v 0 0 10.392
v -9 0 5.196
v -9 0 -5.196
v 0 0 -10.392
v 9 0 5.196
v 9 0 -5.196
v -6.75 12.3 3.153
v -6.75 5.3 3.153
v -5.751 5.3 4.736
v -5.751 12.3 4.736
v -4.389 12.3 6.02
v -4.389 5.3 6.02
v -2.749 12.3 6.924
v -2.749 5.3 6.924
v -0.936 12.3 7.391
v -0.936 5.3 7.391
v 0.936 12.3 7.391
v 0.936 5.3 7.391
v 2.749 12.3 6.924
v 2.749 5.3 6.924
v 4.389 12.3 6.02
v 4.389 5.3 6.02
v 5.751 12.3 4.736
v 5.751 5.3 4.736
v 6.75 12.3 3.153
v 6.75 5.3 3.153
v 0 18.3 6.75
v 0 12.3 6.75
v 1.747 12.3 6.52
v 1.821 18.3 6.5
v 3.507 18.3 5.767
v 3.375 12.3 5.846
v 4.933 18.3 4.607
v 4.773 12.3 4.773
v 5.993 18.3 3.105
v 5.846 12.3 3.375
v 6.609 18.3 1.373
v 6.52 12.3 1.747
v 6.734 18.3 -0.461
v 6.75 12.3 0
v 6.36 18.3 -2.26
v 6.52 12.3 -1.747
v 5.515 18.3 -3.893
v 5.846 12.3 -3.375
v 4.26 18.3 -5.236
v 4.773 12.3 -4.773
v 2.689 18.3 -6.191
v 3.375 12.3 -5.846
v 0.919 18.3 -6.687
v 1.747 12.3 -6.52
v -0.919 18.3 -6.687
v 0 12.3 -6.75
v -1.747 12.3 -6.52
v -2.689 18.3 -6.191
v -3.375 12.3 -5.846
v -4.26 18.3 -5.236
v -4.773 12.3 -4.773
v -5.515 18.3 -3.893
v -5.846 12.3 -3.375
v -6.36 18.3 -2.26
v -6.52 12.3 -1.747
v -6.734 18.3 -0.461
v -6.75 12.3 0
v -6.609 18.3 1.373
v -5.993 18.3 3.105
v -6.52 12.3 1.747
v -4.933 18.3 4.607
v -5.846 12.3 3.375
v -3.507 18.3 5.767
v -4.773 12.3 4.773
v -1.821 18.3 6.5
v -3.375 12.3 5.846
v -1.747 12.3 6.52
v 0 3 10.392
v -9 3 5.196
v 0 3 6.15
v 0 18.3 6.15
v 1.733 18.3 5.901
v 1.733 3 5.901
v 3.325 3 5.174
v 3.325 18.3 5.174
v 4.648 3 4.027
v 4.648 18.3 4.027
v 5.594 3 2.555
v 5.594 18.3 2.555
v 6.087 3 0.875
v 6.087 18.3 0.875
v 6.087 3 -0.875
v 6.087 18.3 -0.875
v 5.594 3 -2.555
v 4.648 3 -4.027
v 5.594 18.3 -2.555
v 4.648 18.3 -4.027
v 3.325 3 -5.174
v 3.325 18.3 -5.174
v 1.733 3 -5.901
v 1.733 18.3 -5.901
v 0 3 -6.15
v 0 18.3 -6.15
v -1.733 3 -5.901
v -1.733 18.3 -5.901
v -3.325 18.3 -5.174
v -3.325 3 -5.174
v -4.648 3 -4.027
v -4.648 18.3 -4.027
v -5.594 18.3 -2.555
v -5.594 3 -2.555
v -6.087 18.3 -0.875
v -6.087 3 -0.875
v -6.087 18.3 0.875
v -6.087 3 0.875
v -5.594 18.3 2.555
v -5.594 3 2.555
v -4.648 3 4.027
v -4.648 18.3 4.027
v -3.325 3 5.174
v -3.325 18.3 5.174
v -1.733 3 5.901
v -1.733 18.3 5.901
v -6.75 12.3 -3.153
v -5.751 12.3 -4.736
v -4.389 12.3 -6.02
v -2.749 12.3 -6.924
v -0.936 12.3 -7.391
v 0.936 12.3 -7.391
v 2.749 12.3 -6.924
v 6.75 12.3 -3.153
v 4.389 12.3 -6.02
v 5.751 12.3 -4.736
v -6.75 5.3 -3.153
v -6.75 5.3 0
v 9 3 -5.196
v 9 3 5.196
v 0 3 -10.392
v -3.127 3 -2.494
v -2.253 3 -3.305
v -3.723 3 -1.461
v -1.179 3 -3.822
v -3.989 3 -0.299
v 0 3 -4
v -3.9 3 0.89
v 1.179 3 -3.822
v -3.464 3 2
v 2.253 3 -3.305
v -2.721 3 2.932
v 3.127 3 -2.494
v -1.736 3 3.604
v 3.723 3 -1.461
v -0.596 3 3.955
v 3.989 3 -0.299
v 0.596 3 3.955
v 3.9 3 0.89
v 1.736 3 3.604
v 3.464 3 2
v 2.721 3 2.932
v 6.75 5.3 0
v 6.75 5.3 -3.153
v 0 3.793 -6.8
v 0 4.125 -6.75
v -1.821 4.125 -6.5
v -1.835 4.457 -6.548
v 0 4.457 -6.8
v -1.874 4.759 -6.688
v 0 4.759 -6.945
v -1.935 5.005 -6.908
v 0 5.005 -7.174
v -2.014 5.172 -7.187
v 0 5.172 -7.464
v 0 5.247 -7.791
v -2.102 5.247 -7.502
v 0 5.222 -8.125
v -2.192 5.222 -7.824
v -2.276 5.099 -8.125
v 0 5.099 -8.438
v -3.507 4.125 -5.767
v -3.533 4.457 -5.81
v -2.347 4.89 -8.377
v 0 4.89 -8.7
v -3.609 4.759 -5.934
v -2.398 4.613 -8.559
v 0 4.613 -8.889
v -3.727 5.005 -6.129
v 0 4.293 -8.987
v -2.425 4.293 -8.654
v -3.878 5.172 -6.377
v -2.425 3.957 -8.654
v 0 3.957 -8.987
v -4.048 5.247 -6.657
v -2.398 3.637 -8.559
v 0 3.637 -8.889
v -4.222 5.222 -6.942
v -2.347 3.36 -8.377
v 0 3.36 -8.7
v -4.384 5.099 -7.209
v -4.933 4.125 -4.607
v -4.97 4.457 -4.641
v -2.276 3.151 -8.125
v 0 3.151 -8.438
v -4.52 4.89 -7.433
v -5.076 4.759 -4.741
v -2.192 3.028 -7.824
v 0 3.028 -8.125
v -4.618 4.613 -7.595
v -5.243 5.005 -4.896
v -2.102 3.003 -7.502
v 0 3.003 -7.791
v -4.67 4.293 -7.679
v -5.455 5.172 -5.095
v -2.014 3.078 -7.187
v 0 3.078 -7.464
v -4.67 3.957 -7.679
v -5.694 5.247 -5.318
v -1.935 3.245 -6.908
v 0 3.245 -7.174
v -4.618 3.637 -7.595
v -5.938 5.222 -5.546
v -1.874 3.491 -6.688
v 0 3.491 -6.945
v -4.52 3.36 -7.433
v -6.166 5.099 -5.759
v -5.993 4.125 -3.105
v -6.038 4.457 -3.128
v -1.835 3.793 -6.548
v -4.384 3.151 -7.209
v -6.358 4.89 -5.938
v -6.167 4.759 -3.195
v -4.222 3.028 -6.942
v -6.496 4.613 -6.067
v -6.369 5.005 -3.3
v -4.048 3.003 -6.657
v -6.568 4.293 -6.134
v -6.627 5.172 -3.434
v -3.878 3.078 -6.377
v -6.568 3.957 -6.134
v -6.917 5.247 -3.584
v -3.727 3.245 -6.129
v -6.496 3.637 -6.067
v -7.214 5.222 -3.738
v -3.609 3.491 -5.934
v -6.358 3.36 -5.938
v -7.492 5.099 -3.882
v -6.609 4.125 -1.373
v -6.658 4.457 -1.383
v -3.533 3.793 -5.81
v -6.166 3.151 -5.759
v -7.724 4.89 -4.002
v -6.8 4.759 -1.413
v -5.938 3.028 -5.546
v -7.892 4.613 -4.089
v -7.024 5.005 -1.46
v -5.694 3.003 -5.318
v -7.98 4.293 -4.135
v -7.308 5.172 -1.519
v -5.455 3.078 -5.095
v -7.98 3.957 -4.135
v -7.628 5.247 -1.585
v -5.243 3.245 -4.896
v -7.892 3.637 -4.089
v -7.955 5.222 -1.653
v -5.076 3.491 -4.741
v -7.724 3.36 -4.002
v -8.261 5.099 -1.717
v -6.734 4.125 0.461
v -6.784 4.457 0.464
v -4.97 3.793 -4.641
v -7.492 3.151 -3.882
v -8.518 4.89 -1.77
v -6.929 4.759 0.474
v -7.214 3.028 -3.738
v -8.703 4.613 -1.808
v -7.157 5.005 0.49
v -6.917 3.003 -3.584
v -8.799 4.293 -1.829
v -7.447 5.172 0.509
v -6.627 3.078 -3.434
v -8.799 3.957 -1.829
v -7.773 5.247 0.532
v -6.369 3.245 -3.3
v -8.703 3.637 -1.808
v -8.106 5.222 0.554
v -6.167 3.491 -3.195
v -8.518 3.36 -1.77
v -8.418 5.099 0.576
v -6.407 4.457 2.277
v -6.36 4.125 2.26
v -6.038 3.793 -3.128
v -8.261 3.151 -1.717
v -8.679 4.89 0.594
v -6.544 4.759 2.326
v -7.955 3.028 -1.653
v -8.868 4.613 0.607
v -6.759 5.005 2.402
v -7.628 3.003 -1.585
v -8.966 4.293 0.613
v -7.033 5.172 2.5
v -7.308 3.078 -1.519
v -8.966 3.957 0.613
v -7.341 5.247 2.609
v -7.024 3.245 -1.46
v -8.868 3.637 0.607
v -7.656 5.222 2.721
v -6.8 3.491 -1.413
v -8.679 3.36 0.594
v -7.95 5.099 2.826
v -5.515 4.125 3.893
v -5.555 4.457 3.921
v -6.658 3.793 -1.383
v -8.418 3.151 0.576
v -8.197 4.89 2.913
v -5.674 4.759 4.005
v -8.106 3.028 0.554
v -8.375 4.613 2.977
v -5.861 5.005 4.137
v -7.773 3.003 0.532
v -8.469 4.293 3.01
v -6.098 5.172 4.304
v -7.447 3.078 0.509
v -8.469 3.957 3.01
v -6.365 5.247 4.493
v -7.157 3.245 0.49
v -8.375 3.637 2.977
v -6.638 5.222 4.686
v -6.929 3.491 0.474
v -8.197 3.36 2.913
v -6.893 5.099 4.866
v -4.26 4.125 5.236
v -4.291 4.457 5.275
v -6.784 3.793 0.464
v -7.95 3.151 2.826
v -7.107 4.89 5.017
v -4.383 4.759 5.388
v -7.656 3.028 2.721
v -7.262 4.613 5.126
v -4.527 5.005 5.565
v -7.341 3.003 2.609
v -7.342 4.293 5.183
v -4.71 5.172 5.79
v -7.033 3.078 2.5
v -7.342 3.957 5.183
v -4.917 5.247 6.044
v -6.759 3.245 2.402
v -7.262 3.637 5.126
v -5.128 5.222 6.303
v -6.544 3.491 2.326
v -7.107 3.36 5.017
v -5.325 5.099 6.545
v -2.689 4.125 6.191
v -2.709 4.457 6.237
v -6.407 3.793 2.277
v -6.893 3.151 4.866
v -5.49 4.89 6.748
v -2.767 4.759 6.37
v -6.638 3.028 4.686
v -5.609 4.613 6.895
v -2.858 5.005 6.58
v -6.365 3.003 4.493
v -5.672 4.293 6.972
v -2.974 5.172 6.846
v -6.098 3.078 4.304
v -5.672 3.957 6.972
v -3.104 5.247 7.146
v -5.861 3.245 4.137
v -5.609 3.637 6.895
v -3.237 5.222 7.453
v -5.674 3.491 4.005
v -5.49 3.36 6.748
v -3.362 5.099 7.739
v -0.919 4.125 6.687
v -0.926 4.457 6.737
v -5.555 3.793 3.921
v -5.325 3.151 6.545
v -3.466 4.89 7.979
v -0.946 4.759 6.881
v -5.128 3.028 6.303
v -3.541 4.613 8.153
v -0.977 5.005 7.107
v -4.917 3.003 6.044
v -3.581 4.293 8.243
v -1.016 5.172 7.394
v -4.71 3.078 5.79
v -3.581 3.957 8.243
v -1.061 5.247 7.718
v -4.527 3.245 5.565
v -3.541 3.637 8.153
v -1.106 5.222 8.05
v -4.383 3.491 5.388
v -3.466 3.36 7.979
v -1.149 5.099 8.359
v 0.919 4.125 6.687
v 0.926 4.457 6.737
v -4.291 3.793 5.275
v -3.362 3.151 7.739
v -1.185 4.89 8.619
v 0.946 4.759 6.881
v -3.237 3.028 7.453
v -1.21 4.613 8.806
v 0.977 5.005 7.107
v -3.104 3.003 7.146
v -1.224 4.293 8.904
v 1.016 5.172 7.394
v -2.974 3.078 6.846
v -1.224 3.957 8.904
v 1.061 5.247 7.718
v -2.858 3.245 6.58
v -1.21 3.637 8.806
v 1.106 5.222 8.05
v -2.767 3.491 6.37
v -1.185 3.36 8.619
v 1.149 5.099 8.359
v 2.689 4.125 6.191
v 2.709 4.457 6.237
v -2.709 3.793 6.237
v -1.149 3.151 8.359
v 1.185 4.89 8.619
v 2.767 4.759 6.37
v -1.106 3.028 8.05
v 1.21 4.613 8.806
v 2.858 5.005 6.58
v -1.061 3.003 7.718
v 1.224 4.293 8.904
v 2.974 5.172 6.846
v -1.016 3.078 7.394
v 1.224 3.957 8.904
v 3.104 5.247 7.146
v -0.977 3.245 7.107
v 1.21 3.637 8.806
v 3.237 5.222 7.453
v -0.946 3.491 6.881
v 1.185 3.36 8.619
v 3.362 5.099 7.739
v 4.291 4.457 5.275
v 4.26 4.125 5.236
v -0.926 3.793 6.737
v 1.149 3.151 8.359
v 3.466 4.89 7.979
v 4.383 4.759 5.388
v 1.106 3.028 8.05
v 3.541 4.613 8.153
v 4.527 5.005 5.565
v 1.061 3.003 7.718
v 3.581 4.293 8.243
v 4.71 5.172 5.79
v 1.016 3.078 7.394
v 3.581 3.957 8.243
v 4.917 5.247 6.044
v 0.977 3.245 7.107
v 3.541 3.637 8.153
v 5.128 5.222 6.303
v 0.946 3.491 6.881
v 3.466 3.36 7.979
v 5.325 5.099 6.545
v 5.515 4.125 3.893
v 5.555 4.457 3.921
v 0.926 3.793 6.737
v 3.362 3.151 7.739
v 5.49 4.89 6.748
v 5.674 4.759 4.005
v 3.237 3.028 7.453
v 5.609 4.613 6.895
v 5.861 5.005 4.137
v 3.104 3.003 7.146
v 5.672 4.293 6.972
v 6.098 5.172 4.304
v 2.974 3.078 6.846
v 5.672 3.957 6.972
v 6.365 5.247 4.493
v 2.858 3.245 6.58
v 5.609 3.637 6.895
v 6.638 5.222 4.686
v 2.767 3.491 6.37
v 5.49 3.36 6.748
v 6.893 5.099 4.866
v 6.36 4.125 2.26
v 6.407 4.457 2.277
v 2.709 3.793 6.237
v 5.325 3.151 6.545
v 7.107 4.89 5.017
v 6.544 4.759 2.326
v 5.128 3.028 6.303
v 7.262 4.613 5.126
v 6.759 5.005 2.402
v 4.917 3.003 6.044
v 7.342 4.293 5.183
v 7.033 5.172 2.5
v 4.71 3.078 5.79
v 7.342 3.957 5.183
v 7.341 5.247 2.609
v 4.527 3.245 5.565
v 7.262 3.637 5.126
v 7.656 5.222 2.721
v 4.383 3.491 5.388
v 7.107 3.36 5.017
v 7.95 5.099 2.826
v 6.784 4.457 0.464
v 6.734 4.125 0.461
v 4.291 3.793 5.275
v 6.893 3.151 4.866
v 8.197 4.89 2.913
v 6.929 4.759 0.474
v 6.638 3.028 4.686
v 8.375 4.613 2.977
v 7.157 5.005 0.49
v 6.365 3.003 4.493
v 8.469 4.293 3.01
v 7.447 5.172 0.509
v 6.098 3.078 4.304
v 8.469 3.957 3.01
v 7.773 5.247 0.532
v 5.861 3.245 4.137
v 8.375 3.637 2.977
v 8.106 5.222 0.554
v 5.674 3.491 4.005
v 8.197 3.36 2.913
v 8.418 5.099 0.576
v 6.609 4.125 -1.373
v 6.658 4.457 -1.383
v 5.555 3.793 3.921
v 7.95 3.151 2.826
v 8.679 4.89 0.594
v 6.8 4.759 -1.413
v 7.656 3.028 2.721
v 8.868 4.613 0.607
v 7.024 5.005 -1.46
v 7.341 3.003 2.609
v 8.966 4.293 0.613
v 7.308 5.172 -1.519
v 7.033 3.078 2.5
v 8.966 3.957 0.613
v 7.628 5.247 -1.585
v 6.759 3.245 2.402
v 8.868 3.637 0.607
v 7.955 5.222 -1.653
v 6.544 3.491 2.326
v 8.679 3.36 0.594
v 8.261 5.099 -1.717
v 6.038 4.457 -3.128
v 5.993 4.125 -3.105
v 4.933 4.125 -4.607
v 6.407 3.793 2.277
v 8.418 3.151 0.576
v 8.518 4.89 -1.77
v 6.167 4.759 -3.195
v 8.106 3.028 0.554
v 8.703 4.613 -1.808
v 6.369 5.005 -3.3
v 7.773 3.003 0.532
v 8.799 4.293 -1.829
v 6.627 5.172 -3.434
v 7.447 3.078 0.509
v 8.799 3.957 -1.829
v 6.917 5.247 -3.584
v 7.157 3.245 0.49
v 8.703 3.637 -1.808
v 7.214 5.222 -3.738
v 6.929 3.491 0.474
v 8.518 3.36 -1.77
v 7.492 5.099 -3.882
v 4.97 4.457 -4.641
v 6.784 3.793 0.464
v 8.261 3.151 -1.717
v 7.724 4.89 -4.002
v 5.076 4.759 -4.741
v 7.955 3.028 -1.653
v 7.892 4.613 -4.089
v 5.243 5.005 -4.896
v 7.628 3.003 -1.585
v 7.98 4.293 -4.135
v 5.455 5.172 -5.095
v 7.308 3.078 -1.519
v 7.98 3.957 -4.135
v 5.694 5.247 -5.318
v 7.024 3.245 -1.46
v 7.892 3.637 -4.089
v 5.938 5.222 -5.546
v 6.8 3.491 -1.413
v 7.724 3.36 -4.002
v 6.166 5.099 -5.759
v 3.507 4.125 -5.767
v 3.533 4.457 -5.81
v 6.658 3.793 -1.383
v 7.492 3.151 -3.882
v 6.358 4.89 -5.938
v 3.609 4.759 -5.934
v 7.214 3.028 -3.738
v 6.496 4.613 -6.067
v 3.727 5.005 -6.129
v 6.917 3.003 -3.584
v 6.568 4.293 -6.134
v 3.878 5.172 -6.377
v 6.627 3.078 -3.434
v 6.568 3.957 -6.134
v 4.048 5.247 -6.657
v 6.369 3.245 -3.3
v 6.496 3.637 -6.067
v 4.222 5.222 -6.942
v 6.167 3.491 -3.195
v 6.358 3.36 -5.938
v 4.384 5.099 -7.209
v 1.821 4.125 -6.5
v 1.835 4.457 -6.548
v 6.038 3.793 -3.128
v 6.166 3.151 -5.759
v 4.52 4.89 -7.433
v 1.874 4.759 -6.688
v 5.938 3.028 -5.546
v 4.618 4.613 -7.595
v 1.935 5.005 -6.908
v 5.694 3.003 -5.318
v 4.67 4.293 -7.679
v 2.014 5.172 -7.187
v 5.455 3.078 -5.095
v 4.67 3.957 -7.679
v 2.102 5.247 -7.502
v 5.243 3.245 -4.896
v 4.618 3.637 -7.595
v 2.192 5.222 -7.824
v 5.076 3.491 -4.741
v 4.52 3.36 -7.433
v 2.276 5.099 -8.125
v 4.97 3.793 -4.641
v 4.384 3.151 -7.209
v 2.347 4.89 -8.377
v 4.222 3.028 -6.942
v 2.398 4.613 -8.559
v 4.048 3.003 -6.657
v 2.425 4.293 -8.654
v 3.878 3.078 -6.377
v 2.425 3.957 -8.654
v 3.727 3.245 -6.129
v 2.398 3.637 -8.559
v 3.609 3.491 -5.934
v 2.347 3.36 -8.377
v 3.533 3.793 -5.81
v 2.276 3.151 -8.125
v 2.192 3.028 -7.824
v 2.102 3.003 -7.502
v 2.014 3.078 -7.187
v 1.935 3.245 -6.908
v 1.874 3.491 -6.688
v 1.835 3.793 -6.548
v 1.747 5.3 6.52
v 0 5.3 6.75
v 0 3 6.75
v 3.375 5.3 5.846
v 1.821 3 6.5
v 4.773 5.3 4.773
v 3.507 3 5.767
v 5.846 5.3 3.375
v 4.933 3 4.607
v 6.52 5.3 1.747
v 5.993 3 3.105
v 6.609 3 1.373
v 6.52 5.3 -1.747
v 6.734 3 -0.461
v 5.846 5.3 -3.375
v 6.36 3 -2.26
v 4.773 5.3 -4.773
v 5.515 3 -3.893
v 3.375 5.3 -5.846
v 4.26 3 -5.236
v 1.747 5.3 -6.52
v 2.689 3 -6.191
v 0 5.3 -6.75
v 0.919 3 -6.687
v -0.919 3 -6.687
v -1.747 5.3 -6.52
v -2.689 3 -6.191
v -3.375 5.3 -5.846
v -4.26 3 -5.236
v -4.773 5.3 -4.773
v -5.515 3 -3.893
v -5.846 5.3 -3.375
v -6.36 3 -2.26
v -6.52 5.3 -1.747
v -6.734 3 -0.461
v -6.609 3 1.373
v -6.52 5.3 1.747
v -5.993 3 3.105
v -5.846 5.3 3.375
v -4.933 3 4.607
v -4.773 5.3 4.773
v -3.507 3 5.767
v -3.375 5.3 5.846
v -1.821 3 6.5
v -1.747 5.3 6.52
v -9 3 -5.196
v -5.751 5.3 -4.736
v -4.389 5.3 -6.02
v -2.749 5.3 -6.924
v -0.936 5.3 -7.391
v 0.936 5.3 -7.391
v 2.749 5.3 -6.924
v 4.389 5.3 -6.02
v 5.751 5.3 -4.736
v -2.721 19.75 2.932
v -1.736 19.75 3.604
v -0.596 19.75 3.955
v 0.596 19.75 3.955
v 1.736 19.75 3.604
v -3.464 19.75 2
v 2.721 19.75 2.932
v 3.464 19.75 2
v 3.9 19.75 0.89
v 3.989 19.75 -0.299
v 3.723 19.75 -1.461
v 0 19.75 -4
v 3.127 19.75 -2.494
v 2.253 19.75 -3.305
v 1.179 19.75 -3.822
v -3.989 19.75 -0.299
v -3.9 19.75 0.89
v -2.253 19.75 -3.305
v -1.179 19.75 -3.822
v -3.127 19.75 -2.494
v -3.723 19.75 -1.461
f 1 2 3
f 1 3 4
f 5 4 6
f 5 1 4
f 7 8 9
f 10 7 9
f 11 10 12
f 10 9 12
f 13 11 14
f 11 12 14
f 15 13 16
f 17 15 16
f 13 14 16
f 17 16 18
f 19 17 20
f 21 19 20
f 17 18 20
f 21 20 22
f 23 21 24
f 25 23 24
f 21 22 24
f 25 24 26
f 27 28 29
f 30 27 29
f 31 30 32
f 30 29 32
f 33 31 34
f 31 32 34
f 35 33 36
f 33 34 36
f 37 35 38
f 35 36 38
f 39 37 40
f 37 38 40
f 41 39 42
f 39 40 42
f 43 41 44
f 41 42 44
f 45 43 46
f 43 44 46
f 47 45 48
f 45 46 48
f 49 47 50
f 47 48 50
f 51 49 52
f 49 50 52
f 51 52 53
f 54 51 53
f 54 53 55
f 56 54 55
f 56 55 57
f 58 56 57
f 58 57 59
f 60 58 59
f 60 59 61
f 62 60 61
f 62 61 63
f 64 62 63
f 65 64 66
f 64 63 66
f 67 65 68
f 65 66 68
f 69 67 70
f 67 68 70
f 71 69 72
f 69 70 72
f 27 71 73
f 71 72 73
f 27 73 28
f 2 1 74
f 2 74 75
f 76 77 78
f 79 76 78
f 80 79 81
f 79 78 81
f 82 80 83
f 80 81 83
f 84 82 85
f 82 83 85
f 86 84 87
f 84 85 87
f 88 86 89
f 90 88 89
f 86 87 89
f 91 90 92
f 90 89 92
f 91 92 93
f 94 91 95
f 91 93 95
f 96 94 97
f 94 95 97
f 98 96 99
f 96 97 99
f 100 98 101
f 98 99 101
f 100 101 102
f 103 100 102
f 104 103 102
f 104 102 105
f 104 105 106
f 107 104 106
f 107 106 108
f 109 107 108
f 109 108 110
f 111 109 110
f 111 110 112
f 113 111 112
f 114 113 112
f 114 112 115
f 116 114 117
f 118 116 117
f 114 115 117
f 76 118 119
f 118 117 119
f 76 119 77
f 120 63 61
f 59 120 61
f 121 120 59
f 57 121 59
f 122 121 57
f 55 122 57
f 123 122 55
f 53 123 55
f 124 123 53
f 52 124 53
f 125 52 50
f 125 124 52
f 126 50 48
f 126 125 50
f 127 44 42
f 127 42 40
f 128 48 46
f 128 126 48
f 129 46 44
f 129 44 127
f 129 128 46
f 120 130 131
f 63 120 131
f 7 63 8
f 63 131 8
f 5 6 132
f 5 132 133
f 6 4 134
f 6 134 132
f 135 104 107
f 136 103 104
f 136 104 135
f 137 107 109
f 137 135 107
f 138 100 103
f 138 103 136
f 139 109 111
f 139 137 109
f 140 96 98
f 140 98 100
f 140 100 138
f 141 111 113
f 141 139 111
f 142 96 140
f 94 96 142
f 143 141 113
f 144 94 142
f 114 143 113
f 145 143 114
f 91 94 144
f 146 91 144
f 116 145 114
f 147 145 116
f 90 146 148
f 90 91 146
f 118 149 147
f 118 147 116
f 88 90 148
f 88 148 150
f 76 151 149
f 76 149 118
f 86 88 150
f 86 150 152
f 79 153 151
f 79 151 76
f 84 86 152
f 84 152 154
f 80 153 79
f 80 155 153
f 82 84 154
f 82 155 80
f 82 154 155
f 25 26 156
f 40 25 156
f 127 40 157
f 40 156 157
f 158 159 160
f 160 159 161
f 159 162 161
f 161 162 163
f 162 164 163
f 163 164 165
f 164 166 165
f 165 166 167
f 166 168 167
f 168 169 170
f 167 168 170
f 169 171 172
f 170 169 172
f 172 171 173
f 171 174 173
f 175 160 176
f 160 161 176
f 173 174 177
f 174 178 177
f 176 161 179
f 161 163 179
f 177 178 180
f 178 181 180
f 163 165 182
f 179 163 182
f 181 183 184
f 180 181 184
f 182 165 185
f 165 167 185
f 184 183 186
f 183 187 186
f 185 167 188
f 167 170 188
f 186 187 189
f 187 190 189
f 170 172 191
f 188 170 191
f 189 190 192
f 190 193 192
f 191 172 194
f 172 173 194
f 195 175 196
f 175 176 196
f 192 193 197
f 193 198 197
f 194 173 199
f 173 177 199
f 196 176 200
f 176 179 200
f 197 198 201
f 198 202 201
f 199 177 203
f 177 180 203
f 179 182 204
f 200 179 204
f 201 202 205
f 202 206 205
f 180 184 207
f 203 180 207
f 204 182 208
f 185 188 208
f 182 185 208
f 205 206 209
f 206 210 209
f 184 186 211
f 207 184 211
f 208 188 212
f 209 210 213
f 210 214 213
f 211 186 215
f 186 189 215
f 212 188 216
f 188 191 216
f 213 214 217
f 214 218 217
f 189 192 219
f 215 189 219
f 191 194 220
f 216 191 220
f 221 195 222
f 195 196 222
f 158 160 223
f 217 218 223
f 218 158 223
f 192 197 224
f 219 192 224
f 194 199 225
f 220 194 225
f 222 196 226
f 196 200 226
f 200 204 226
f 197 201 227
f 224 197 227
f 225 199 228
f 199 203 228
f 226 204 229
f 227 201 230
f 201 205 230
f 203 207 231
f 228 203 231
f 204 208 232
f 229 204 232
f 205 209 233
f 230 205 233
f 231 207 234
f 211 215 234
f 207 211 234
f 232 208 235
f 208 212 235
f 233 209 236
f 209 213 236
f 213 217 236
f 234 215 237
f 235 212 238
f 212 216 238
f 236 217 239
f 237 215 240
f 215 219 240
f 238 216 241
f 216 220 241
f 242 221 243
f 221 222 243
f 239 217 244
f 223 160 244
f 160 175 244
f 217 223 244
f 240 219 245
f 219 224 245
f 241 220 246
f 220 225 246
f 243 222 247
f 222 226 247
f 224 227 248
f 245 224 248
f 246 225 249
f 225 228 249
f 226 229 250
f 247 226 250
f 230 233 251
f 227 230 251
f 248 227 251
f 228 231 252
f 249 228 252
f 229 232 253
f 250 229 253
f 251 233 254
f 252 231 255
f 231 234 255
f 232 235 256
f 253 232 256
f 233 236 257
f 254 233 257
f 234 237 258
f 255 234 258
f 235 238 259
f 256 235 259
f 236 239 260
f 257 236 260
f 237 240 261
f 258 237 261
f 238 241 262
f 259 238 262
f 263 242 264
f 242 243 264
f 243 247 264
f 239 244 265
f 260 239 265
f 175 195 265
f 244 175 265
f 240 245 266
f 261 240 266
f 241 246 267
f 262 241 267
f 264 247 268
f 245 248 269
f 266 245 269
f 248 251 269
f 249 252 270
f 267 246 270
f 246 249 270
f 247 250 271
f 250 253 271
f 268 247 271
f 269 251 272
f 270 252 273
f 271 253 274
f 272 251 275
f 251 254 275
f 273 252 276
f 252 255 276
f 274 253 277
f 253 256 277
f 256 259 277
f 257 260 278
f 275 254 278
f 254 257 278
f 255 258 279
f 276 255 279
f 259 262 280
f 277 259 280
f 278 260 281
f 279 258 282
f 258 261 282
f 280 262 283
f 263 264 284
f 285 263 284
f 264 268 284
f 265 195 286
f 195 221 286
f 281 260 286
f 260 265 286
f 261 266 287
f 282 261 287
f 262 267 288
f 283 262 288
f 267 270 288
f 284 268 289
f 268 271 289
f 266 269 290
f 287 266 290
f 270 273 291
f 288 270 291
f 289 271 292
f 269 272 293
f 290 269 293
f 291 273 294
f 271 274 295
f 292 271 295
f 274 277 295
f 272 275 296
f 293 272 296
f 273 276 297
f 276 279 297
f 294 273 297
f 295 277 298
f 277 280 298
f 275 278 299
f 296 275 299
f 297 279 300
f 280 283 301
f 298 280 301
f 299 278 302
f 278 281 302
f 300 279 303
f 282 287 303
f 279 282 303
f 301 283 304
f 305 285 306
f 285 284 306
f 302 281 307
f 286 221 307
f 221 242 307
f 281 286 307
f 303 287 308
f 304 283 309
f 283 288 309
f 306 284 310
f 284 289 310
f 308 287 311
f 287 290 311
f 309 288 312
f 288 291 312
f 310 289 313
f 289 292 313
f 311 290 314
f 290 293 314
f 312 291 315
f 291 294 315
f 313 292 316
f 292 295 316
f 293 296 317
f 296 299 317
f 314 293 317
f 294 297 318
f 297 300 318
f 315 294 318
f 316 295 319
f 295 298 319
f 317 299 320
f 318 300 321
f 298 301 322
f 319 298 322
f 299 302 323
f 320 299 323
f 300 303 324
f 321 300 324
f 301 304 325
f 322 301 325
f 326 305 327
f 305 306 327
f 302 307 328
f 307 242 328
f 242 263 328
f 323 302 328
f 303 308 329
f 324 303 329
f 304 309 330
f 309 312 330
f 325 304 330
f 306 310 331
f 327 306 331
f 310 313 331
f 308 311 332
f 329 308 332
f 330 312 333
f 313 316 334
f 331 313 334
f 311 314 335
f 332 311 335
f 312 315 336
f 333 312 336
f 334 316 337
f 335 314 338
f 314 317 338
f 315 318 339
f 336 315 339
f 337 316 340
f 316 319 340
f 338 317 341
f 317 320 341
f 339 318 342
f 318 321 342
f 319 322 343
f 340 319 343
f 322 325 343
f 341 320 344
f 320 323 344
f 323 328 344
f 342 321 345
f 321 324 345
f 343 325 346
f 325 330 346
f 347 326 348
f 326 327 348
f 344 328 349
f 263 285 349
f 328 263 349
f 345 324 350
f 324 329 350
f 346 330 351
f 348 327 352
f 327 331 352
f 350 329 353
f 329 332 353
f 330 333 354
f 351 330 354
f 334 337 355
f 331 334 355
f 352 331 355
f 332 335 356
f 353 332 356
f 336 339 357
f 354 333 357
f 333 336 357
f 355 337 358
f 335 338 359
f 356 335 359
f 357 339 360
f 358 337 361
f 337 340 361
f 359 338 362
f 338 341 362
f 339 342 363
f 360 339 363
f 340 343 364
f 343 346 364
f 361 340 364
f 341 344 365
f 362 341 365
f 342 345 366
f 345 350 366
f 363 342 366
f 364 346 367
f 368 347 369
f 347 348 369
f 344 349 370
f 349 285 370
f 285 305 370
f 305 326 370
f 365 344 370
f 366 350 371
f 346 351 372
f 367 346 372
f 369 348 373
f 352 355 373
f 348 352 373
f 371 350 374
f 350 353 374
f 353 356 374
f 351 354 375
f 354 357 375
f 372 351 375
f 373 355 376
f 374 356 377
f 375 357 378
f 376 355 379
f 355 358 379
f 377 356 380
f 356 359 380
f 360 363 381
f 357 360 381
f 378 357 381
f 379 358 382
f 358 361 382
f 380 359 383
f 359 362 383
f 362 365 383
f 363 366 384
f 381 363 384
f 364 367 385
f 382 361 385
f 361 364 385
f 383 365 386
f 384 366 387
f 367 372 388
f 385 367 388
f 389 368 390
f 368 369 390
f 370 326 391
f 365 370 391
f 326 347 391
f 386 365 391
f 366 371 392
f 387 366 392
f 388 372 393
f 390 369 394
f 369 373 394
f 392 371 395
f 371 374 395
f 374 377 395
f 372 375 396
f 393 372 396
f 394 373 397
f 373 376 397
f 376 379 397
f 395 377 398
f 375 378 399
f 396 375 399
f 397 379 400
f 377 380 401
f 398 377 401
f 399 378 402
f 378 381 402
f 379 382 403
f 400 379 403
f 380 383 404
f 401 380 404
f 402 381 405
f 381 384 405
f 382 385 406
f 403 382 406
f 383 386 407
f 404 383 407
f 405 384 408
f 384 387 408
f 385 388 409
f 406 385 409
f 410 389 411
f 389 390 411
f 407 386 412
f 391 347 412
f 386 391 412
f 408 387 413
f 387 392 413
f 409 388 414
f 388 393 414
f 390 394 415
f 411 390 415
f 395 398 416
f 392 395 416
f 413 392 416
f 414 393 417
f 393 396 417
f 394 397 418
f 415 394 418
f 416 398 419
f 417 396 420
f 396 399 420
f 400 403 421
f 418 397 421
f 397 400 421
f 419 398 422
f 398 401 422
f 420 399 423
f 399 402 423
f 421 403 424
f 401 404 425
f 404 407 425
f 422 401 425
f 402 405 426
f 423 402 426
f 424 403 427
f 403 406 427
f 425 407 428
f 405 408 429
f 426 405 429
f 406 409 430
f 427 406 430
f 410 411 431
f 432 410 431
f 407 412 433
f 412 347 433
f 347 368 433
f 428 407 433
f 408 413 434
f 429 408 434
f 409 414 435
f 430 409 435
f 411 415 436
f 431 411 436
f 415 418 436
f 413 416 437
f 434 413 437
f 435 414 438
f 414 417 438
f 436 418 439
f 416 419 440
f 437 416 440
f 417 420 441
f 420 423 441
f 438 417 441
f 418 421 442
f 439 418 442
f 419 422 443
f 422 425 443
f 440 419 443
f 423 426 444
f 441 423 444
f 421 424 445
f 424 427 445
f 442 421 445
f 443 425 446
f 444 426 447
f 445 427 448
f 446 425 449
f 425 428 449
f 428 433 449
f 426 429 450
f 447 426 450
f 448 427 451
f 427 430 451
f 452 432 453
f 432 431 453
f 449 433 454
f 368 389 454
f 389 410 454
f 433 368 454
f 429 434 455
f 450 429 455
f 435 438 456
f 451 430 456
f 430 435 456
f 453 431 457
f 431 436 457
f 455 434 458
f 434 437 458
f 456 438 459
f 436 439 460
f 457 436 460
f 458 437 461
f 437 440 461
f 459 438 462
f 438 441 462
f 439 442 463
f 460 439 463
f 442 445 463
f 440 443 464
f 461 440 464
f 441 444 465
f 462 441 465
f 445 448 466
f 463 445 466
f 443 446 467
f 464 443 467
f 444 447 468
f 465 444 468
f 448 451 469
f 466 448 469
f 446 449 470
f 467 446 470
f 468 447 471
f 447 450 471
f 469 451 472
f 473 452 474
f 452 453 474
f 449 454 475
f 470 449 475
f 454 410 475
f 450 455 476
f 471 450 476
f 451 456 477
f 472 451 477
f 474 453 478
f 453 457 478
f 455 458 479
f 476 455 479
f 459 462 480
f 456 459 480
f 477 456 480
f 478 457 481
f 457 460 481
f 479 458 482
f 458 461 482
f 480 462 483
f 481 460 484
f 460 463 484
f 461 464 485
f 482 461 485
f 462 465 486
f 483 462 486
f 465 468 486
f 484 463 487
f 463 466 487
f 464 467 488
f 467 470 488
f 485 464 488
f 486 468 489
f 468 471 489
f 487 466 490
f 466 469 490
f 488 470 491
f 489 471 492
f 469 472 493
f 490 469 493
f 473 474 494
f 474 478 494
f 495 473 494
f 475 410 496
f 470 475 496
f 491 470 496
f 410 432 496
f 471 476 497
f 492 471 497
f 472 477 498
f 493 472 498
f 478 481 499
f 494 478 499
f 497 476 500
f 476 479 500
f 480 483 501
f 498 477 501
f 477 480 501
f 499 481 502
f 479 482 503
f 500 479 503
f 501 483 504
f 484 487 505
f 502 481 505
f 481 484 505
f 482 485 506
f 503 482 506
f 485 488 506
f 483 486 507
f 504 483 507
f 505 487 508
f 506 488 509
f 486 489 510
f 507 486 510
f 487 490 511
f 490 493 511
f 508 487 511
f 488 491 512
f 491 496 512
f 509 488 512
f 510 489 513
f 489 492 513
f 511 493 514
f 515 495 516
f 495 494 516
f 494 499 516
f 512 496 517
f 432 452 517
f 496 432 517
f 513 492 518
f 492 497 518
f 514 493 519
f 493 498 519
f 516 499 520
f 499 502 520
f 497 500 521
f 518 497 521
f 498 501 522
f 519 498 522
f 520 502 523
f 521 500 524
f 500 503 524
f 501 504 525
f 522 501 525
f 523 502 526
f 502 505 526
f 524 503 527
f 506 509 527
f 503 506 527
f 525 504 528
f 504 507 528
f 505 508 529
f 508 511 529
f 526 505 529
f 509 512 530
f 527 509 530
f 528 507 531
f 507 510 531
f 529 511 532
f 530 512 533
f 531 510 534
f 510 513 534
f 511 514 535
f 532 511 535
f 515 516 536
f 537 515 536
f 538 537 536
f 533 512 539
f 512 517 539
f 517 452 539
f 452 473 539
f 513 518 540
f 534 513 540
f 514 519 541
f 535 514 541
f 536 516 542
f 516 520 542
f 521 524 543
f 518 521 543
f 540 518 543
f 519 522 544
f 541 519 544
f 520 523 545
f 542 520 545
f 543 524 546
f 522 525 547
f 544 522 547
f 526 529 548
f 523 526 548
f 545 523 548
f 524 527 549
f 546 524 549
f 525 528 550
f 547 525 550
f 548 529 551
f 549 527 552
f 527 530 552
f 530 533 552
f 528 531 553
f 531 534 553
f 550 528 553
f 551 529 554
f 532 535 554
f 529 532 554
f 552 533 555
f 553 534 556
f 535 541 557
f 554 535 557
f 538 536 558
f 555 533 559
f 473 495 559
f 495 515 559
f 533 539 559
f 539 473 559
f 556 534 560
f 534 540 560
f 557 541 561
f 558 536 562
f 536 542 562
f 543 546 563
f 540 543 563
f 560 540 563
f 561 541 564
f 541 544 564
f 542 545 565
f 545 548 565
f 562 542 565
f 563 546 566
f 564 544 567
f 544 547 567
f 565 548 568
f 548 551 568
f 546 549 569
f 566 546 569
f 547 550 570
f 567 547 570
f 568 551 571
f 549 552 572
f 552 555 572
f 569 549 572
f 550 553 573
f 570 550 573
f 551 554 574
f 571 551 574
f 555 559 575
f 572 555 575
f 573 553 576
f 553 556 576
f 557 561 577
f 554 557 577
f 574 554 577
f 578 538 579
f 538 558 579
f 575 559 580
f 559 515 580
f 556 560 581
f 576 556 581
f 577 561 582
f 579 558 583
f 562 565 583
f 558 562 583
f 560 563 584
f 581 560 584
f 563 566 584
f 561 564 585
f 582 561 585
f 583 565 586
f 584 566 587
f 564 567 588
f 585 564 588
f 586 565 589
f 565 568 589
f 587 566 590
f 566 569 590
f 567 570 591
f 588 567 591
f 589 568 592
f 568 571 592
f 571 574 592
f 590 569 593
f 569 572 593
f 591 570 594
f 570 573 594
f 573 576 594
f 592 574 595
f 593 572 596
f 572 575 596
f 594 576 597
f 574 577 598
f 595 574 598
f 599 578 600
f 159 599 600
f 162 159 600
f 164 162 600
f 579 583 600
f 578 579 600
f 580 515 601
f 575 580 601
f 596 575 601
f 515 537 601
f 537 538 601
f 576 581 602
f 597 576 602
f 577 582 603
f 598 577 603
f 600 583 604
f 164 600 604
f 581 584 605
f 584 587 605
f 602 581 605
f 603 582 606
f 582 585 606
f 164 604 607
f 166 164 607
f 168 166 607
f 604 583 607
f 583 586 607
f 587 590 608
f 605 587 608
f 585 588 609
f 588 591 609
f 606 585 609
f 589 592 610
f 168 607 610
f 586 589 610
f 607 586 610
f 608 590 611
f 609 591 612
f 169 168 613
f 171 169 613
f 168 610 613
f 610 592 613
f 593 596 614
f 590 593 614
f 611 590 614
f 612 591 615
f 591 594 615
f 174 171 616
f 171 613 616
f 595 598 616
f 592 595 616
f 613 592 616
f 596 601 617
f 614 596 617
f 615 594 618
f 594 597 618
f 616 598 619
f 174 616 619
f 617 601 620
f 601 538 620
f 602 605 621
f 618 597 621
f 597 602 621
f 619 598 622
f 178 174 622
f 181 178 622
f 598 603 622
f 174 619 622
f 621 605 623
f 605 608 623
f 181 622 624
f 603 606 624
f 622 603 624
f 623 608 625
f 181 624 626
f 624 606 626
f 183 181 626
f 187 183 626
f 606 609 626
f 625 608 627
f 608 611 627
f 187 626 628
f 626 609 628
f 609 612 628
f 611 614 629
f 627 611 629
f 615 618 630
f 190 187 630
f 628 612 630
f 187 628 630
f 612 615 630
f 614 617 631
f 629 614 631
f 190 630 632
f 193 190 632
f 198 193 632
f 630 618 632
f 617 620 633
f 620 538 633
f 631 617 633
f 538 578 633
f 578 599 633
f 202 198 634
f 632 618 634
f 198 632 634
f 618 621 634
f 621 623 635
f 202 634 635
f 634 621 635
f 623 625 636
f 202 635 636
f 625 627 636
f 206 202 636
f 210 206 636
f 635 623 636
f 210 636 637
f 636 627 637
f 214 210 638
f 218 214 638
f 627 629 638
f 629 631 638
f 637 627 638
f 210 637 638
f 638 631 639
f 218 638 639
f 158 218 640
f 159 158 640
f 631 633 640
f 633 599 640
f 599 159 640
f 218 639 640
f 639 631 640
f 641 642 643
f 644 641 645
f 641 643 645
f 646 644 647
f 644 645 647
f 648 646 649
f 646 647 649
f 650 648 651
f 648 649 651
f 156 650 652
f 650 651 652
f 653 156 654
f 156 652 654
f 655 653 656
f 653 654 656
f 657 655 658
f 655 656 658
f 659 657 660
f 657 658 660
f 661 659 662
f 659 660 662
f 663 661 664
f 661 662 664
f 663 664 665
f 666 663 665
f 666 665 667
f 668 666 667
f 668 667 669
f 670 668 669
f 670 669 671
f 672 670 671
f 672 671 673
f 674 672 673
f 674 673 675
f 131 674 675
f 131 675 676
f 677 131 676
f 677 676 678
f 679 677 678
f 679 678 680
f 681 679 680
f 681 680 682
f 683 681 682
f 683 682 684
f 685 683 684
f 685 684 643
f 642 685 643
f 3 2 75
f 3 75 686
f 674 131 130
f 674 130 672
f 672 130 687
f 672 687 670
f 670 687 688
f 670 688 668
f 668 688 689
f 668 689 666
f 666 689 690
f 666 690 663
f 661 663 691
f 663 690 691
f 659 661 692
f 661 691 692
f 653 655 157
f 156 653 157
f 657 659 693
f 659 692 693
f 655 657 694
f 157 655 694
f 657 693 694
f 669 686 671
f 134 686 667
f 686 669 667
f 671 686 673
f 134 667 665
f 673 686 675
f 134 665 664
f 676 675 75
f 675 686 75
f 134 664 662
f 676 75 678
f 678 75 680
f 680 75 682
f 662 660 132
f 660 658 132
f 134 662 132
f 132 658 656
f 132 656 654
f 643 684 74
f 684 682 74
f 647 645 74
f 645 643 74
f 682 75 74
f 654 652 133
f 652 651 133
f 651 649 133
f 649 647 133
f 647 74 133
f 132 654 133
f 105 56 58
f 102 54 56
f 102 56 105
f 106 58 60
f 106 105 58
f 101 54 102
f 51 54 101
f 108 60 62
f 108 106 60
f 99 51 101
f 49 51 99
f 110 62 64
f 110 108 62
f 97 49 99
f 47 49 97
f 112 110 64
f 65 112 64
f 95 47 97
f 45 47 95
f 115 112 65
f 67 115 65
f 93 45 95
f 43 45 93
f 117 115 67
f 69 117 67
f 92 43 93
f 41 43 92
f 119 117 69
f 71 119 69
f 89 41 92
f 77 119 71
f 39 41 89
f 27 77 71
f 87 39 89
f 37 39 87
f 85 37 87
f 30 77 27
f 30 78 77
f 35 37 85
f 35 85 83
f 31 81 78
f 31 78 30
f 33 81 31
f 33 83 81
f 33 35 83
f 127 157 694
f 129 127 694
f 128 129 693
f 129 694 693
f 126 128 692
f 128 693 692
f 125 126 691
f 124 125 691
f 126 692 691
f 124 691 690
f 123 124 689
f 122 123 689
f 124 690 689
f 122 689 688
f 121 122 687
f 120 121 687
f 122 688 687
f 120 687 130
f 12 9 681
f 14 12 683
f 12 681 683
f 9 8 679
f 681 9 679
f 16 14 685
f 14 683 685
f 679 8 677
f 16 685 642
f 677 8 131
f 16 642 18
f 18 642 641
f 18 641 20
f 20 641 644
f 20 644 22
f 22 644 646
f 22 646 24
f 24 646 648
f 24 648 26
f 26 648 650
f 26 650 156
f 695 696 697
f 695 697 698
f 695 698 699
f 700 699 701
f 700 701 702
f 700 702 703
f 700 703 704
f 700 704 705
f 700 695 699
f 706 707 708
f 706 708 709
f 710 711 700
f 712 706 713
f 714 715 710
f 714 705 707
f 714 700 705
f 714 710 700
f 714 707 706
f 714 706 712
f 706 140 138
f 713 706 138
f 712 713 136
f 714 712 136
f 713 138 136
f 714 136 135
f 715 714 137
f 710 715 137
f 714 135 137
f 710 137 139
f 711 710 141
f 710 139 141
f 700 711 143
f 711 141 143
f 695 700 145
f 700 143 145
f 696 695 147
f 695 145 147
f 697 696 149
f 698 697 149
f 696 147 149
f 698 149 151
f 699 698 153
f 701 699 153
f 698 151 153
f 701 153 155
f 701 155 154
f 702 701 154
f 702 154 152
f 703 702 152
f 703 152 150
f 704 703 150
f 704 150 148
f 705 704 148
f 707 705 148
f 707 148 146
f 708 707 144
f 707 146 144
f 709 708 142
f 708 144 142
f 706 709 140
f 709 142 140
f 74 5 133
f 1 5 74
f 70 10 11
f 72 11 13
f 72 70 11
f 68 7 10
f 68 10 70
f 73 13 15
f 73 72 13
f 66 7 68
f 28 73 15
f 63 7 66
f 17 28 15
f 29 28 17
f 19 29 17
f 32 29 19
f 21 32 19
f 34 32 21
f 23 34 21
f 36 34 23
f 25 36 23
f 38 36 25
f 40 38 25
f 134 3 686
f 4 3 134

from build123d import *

# Parameters (mm, degrees)
SKETCH1_R           = 6.75
BOSS_EXTRUDE1_DEPTH = 18.3
BOSS_EXTRUDE2_DEPTH = 3
SKETCH3_R           = 6.15
CUT_EXTRUDE1_DEPTH  = 15.3
SKETCH4_R           = 4
BOSS_EXTRUDE3_DEPTH = 16.75
SKETCH5_R           = 1.125
BOSS_EXTRUDE4_START = -7
BOSS_EXTRUDE4_DEPTH = 7


with BuildPart() as part:
    # Sketch1 → Boss-Extrude1 (new body)
    with BuildSketch(Plane(origin=(0, 0, 0), x_dir=(1, 0, 0), z_dir=(0, 1, 0))):
        with Locations(Location((0, 0, 0), (0, 0, 270))):
            Circle(SKETCH1_R)
    extrude(amount=BOSS_EXTRUDE1_DEPTH)

    # Sketch2 → Boss-Extrude2 (add)
    with BuildSketch(Plane.XZ):
        Polygon((0, 10.392304845), (-9, 5.196152423), (-9, -5.196152423), (0, -10.392304845), (9, -5.196152423), (9, 5.196152423), align=None)
    extrude(amount=-BOSS_EXTRUDE2_DEPTH)

    # Sketch3 → Cut-Extrude1 (cut)
    with BuildSketch(Plane(origin=(0, 18.3, 0), x_dir=(1, 0, 0), z_dir=(0, 1, 0))):
        with Locations(Location((0, 0, 0), (0, 0, 270))):
            Circle(SKETCH3_R)
    extrude(amount=-CUT_EXTRUDE1_DEPTH, mode=Mode.SUBTRACT)

    # Sketch4 → Boss-Extrude3 (add)
    with BuildSketch(Plane(origin=(0, 3, 0), x_dir=(1, 0, 0), z_dir=(0, 1, 0))):
        with Locations(Location((0, 0, 0), (0, 0, 90))):
            Circle(SKETCH4_R)
    extrude(amount=BOSS_EXTRUDE3_DEPTH)

    # Sketch6 → Boss-Extrude4 (add)
    with BuildSketch(Plane(origin=(0, 12.3, 0), x_dir=(1, 0, 0), z_dir=(0, 1, 0)).offset(BOSS_EXTRUDE4_START)):
        with BuildLine():
            Line((-6.75, 3.152776554), (-6.75, 0))
            ThreePointArc((-6.75, 0), (0, 6.75), (6.75, 0))
            Line((6.75, 0), (6.75, 3.152776554))
            ThreePointArc((6.75, 3.152776554), (0, 7.45), (-6.75, 3.152776554))
        make_face()
        with BuildLine():
            ThreePointArc((6.75, 0), (0, -6.75), (-6.75, 0))
            Line((-6.75, 0), (-6.75, -3.152776554))
            ThreePointArc((-6.75, -3.152776554), (0, -7.45), (6.75, -3.152776554))
            Line((6.75, -3.152776554), (6.75, 0))
        make_face()
    extrude(amount=BOSS_EXTRUDE4_DEPTH)


with BuildPart() as body_2:
    # Sketch5 → Revolve1 (revolve)
    with BuildSketch(Plane.XY, mode=Mode.PRIVATE) as revolve1_sk:
        with Locations((-7.875, 4.125)):
            Circle(SKETCH5_R)
    revolve(revolve1_sk.sketch.rotate(Axis((0, -2.633476414, 0), (0, 1, 0)), 270), axis=Axis((0, -2.633476414, 0), (0, 1, 0)))


solid = Compound([part.part, body_2.part])
